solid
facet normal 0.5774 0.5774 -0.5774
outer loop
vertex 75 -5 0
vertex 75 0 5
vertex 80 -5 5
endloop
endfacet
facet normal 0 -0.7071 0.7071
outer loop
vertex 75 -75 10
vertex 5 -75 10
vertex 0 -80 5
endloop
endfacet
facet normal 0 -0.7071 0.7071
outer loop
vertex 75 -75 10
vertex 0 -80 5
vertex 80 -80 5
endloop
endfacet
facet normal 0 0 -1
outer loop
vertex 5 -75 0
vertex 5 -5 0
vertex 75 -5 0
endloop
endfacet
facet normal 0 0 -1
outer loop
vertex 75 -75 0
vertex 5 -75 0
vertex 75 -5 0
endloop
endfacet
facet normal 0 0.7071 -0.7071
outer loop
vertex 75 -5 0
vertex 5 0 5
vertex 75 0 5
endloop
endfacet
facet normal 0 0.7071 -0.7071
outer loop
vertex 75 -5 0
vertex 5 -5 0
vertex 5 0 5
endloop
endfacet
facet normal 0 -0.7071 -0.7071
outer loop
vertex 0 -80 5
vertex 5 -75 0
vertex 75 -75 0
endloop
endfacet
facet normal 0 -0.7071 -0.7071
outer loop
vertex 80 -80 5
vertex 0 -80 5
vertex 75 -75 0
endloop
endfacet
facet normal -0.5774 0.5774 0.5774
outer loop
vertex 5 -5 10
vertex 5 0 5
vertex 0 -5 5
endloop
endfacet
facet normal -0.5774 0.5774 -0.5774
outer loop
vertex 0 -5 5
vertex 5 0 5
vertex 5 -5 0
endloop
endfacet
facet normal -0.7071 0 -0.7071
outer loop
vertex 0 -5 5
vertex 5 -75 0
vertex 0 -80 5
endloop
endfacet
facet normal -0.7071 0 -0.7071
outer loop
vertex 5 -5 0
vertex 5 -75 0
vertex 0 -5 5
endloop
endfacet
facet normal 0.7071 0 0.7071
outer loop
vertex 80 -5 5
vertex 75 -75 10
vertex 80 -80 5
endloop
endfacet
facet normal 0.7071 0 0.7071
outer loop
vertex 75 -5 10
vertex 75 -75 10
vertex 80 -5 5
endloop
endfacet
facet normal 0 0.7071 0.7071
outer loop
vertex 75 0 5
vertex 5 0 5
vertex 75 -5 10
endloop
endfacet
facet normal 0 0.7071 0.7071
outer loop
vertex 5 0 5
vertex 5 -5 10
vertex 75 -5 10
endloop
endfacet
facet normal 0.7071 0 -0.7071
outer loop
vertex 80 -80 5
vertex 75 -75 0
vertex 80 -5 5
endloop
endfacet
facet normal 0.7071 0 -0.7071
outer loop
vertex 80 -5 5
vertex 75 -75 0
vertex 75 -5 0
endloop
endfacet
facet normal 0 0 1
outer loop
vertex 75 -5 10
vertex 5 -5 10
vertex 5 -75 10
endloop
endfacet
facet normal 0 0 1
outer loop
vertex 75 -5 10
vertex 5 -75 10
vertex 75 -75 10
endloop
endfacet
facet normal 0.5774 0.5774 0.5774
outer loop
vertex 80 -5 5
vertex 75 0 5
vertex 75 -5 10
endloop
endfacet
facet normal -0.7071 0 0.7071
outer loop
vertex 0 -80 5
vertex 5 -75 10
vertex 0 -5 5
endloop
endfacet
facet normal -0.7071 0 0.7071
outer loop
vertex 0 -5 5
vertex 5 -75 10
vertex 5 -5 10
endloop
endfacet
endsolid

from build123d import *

# Parameters (mm, degrees)
F0_W     = 80
F0_H     = 80
F1_DEPTH = 10
F2_SIZE  = 4.99999


# Not quite as in the source:
# - a fillet or chamfer is up to 0.001 mm smaller than in the source, because OpenCascade refuses the exact size


with BuildPart() as f1:
    # F0 (on Top) → F1 (new body)
    with BuildSketch(Plane.XY):
        with Locations((40, -40)):
            Rectangle(F0_W, F0_H)
    extrude(amount=F1_DEPTH)

    # F2 (size 5 in the source; OpenCascade refuses exactly that, so slightly less here)
    f2_edges = [f1.edges().sort_by_distance(p)[0] for p in [
        (40, 0, 0),
        (40, 0, 10),
        (0, 0, 5),
        (80, 0, 5),
        (80, -40, 0),
        (80, -40, 10),
        (40, -80, 0),
        (40, -80, 10),
        (0, -40, 0),
        (0, -40, 10),
    ]]
    chamfer(f2_edges, length=F2_SIZE)


solid = f1.part
